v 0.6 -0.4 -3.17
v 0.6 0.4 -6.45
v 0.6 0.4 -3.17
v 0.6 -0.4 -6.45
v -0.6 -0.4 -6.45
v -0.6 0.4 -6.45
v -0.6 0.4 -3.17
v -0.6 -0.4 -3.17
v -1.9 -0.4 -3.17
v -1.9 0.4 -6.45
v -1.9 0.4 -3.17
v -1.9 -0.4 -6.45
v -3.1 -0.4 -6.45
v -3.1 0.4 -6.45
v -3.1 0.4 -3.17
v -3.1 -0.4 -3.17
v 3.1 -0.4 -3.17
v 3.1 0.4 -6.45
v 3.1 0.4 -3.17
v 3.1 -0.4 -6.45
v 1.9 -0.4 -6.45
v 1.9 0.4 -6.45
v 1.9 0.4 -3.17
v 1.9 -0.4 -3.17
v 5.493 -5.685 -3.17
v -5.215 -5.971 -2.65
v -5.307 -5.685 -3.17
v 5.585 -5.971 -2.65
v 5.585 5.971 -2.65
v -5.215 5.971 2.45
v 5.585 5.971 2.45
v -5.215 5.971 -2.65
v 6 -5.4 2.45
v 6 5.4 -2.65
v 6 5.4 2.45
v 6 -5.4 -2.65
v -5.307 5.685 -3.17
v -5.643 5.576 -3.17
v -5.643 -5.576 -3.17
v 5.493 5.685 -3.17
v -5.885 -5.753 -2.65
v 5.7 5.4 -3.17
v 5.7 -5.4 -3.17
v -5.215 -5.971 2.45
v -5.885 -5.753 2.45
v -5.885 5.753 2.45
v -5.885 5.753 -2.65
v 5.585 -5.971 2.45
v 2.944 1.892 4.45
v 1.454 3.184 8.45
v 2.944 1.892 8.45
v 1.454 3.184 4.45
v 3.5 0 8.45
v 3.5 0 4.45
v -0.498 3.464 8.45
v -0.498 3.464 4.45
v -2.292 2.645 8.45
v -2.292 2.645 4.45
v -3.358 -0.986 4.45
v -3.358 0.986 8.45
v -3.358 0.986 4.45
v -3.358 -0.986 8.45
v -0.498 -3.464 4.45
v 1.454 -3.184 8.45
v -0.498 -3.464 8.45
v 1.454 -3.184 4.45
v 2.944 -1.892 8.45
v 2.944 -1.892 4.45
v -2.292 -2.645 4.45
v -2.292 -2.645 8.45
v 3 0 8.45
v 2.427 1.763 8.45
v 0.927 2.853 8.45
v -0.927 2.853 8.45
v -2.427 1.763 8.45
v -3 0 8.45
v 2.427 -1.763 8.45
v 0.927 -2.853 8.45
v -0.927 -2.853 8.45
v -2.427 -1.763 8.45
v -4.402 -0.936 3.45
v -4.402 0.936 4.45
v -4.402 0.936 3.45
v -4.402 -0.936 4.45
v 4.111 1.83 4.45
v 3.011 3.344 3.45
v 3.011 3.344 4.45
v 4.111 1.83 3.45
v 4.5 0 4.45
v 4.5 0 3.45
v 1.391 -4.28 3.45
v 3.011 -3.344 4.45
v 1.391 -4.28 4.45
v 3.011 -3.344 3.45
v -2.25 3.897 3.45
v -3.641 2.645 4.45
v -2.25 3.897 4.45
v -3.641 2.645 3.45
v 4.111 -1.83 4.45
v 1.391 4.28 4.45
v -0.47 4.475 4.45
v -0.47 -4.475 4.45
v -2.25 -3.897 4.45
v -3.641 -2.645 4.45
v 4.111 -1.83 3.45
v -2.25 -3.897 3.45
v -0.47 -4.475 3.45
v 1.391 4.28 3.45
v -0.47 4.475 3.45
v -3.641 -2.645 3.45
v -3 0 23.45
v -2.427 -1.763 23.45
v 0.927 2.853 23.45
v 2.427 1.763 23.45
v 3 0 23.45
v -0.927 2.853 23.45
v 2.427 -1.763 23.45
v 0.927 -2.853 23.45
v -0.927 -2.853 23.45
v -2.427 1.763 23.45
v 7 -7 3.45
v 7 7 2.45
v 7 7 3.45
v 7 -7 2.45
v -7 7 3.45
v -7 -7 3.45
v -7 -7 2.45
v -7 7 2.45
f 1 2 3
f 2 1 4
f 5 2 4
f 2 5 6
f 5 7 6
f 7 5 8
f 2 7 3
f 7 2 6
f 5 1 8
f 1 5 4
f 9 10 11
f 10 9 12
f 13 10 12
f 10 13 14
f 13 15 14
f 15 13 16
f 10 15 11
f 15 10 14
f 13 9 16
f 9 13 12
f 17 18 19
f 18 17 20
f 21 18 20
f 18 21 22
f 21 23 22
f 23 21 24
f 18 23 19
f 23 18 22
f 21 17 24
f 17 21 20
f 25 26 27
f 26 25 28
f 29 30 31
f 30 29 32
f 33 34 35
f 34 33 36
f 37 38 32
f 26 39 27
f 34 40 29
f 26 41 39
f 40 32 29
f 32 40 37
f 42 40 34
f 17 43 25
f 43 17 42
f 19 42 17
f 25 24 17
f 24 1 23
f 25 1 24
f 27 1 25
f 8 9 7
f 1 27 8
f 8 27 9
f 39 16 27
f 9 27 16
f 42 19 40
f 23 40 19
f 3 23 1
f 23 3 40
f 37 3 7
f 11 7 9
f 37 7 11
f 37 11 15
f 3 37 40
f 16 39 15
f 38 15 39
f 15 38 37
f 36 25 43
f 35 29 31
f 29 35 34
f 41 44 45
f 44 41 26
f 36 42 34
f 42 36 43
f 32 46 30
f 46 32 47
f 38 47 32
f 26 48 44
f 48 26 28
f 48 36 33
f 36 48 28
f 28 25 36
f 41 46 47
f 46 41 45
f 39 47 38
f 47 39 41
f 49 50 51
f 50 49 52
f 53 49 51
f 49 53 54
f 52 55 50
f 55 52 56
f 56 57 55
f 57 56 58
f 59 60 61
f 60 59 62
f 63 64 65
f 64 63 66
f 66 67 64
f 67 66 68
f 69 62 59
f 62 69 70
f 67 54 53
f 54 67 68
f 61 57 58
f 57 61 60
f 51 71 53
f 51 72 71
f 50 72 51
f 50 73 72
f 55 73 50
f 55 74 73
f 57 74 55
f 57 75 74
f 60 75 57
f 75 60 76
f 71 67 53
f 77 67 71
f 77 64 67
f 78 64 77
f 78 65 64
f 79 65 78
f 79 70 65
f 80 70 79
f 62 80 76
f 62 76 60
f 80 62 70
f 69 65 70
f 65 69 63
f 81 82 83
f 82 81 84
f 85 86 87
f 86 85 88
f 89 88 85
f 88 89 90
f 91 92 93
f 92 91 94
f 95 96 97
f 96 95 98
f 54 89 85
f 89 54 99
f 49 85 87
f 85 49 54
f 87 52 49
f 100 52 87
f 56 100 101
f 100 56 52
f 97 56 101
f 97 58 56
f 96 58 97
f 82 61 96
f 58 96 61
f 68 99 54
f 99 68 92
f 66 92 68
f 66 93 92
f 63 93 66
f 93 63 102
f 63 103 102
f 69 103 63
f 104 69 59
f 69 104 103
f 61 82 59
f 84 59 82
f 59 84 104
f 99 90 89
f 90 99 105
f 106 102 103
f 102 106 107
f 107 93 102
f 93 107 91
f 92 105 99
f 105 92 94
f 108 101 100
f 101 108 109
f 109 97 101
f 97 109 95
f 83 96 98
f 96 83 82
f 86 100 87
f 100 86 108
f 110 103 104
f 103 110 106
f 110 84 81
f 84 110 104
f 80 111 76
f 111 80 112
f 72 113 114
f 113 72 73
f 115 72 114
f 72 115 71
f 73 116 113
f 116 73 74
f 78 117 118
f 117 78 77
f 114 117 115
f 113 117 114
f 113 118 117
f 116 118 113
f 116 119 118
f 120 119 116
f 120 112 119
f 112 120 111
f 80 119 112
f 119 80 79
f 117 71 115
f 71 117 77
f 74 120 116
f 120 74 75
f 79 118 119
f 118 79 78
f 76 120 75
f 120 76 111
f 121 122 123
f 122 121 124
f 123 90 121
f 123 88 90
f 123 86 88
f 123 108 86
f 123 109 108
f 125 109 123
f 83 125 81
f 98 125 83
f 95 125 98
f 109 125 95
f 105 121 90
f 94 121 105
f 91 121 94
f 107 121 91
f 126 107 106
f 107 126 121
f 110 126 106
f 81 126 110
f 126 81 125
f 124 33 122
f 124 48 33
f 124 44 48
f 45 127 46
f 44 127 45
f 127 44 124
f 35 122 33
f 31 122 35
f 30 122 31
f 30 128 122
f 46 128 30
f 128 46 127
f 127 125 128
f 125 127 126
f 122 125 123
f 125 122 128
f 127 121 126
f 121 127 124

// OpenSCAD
// Parameters
body_width = 12; //[6:24:0.5]
body_depth = 12; //[6:24:0.5]
body_height = 6.5; //[3.25:13:0.25]
body_corner_radius = 1; //[0.5:2:0.1]
mounting_thickness = 3; //[1.5:6:0.5]
boss_diameter = 9; //[6:14:0.5]
boss_height = 2; //[1:4:0.25]
thread_diameter = 7; //[5:12:0.5]
thread_height = 6; //[3:12:0.5]
shaft_diameter = 6; //[3:10:0.5]
shaft_length = 15; //[7.5:30:0.5]
face_plate_width = 14; //[10:28:0.5]
face_plate_depth = 14; //[10:28:0.5]
face_plate_thickness = 1; //[0.5:3:0.25]
wafer_thickness = 1.2; //[0.6:2.4:0.1]
wafer_margin = 0.6; //[0.3:1.5:0.1]
lug_width = 1.2; //[0.6:2.4:0.1]
lug_thickness = 0.8; //[0.4:1.6:0.1]
lug_length = 4; //[2:8:0.5]
lug_spacing = 2.5; //[1.5:5:0.25]
overlap = 0.8; //[0.5:2:0.1]
fillet_sphere_radius = 0.6; //[0.3:1.2:0.1]

// Potentiometer - complete geometry
module potentiometer() {
  color([0.85, 0.85, 0.8]) {
    // Body with rounded corners
    minkowski() {
      translate([0, 0, 0])
        cube([body_width - 2 * fillet_sphere_radius, body_depth - 2 * fillet_sphere_radius, body_height - 2 * fillet_sphere_radius], center=true);
      sphere(r=fillet_sphere_radius, center=true);
    }
    
    // Mounting boss thread
    translate([0, 0, body_height/2 + thread_height/2 - overlap])
      cylinder(r=thread_diameter/2, h=thread_height, center=true);
    
    // Mounting boss collar
    translate([0, 0, body_height/2 + boss_height/2 - overlap])
      cylinder(r=boss_diameter/2, h=boss_height, center=true);
    
    // Shaft
    translate([0, 0, body_height/2 + thread_height + shaft_length/2 - overlap])
      cylinder(r=shaft_diameter/2, h=shaft_length, center=true);
    
    // Face plate
    translate([0, 0, body_height/2 + face_plate_thickness/2 - overlap])
      cube([face_plate_width, face_plate_depth, face_plate_thickness], center=true);
    
    // Wafer section
    translate([0, 0, -body_height/2 + wafer_thickness/2 + overlap])
      cube([body_width - 2 * wafer_margin, body_depth - 2 * wafer_margin, wafer_thickness], center=true);
    
    // Solder lugs/pins
    union() {
      translate([0, 0, -body_height/2 - lug_length/2 + overlap])
        cube([lug_width, lug_thickness, lug_length], center=true);
      translate([-lug_spacing, 0, -body_height/2 - lug_length/2 + overlap])
        cube([lug_width, lug_thickness, lug_length], center=true);
      translate([lug_spacing, 0, -body_height/2 - lug_length/2 + overlap])
        cube([lug_width, lug_thickness, lug_length], center=true);
    }
  }
}

// Assembly
module assembly() {
  potentiometer();
}

assembly();
